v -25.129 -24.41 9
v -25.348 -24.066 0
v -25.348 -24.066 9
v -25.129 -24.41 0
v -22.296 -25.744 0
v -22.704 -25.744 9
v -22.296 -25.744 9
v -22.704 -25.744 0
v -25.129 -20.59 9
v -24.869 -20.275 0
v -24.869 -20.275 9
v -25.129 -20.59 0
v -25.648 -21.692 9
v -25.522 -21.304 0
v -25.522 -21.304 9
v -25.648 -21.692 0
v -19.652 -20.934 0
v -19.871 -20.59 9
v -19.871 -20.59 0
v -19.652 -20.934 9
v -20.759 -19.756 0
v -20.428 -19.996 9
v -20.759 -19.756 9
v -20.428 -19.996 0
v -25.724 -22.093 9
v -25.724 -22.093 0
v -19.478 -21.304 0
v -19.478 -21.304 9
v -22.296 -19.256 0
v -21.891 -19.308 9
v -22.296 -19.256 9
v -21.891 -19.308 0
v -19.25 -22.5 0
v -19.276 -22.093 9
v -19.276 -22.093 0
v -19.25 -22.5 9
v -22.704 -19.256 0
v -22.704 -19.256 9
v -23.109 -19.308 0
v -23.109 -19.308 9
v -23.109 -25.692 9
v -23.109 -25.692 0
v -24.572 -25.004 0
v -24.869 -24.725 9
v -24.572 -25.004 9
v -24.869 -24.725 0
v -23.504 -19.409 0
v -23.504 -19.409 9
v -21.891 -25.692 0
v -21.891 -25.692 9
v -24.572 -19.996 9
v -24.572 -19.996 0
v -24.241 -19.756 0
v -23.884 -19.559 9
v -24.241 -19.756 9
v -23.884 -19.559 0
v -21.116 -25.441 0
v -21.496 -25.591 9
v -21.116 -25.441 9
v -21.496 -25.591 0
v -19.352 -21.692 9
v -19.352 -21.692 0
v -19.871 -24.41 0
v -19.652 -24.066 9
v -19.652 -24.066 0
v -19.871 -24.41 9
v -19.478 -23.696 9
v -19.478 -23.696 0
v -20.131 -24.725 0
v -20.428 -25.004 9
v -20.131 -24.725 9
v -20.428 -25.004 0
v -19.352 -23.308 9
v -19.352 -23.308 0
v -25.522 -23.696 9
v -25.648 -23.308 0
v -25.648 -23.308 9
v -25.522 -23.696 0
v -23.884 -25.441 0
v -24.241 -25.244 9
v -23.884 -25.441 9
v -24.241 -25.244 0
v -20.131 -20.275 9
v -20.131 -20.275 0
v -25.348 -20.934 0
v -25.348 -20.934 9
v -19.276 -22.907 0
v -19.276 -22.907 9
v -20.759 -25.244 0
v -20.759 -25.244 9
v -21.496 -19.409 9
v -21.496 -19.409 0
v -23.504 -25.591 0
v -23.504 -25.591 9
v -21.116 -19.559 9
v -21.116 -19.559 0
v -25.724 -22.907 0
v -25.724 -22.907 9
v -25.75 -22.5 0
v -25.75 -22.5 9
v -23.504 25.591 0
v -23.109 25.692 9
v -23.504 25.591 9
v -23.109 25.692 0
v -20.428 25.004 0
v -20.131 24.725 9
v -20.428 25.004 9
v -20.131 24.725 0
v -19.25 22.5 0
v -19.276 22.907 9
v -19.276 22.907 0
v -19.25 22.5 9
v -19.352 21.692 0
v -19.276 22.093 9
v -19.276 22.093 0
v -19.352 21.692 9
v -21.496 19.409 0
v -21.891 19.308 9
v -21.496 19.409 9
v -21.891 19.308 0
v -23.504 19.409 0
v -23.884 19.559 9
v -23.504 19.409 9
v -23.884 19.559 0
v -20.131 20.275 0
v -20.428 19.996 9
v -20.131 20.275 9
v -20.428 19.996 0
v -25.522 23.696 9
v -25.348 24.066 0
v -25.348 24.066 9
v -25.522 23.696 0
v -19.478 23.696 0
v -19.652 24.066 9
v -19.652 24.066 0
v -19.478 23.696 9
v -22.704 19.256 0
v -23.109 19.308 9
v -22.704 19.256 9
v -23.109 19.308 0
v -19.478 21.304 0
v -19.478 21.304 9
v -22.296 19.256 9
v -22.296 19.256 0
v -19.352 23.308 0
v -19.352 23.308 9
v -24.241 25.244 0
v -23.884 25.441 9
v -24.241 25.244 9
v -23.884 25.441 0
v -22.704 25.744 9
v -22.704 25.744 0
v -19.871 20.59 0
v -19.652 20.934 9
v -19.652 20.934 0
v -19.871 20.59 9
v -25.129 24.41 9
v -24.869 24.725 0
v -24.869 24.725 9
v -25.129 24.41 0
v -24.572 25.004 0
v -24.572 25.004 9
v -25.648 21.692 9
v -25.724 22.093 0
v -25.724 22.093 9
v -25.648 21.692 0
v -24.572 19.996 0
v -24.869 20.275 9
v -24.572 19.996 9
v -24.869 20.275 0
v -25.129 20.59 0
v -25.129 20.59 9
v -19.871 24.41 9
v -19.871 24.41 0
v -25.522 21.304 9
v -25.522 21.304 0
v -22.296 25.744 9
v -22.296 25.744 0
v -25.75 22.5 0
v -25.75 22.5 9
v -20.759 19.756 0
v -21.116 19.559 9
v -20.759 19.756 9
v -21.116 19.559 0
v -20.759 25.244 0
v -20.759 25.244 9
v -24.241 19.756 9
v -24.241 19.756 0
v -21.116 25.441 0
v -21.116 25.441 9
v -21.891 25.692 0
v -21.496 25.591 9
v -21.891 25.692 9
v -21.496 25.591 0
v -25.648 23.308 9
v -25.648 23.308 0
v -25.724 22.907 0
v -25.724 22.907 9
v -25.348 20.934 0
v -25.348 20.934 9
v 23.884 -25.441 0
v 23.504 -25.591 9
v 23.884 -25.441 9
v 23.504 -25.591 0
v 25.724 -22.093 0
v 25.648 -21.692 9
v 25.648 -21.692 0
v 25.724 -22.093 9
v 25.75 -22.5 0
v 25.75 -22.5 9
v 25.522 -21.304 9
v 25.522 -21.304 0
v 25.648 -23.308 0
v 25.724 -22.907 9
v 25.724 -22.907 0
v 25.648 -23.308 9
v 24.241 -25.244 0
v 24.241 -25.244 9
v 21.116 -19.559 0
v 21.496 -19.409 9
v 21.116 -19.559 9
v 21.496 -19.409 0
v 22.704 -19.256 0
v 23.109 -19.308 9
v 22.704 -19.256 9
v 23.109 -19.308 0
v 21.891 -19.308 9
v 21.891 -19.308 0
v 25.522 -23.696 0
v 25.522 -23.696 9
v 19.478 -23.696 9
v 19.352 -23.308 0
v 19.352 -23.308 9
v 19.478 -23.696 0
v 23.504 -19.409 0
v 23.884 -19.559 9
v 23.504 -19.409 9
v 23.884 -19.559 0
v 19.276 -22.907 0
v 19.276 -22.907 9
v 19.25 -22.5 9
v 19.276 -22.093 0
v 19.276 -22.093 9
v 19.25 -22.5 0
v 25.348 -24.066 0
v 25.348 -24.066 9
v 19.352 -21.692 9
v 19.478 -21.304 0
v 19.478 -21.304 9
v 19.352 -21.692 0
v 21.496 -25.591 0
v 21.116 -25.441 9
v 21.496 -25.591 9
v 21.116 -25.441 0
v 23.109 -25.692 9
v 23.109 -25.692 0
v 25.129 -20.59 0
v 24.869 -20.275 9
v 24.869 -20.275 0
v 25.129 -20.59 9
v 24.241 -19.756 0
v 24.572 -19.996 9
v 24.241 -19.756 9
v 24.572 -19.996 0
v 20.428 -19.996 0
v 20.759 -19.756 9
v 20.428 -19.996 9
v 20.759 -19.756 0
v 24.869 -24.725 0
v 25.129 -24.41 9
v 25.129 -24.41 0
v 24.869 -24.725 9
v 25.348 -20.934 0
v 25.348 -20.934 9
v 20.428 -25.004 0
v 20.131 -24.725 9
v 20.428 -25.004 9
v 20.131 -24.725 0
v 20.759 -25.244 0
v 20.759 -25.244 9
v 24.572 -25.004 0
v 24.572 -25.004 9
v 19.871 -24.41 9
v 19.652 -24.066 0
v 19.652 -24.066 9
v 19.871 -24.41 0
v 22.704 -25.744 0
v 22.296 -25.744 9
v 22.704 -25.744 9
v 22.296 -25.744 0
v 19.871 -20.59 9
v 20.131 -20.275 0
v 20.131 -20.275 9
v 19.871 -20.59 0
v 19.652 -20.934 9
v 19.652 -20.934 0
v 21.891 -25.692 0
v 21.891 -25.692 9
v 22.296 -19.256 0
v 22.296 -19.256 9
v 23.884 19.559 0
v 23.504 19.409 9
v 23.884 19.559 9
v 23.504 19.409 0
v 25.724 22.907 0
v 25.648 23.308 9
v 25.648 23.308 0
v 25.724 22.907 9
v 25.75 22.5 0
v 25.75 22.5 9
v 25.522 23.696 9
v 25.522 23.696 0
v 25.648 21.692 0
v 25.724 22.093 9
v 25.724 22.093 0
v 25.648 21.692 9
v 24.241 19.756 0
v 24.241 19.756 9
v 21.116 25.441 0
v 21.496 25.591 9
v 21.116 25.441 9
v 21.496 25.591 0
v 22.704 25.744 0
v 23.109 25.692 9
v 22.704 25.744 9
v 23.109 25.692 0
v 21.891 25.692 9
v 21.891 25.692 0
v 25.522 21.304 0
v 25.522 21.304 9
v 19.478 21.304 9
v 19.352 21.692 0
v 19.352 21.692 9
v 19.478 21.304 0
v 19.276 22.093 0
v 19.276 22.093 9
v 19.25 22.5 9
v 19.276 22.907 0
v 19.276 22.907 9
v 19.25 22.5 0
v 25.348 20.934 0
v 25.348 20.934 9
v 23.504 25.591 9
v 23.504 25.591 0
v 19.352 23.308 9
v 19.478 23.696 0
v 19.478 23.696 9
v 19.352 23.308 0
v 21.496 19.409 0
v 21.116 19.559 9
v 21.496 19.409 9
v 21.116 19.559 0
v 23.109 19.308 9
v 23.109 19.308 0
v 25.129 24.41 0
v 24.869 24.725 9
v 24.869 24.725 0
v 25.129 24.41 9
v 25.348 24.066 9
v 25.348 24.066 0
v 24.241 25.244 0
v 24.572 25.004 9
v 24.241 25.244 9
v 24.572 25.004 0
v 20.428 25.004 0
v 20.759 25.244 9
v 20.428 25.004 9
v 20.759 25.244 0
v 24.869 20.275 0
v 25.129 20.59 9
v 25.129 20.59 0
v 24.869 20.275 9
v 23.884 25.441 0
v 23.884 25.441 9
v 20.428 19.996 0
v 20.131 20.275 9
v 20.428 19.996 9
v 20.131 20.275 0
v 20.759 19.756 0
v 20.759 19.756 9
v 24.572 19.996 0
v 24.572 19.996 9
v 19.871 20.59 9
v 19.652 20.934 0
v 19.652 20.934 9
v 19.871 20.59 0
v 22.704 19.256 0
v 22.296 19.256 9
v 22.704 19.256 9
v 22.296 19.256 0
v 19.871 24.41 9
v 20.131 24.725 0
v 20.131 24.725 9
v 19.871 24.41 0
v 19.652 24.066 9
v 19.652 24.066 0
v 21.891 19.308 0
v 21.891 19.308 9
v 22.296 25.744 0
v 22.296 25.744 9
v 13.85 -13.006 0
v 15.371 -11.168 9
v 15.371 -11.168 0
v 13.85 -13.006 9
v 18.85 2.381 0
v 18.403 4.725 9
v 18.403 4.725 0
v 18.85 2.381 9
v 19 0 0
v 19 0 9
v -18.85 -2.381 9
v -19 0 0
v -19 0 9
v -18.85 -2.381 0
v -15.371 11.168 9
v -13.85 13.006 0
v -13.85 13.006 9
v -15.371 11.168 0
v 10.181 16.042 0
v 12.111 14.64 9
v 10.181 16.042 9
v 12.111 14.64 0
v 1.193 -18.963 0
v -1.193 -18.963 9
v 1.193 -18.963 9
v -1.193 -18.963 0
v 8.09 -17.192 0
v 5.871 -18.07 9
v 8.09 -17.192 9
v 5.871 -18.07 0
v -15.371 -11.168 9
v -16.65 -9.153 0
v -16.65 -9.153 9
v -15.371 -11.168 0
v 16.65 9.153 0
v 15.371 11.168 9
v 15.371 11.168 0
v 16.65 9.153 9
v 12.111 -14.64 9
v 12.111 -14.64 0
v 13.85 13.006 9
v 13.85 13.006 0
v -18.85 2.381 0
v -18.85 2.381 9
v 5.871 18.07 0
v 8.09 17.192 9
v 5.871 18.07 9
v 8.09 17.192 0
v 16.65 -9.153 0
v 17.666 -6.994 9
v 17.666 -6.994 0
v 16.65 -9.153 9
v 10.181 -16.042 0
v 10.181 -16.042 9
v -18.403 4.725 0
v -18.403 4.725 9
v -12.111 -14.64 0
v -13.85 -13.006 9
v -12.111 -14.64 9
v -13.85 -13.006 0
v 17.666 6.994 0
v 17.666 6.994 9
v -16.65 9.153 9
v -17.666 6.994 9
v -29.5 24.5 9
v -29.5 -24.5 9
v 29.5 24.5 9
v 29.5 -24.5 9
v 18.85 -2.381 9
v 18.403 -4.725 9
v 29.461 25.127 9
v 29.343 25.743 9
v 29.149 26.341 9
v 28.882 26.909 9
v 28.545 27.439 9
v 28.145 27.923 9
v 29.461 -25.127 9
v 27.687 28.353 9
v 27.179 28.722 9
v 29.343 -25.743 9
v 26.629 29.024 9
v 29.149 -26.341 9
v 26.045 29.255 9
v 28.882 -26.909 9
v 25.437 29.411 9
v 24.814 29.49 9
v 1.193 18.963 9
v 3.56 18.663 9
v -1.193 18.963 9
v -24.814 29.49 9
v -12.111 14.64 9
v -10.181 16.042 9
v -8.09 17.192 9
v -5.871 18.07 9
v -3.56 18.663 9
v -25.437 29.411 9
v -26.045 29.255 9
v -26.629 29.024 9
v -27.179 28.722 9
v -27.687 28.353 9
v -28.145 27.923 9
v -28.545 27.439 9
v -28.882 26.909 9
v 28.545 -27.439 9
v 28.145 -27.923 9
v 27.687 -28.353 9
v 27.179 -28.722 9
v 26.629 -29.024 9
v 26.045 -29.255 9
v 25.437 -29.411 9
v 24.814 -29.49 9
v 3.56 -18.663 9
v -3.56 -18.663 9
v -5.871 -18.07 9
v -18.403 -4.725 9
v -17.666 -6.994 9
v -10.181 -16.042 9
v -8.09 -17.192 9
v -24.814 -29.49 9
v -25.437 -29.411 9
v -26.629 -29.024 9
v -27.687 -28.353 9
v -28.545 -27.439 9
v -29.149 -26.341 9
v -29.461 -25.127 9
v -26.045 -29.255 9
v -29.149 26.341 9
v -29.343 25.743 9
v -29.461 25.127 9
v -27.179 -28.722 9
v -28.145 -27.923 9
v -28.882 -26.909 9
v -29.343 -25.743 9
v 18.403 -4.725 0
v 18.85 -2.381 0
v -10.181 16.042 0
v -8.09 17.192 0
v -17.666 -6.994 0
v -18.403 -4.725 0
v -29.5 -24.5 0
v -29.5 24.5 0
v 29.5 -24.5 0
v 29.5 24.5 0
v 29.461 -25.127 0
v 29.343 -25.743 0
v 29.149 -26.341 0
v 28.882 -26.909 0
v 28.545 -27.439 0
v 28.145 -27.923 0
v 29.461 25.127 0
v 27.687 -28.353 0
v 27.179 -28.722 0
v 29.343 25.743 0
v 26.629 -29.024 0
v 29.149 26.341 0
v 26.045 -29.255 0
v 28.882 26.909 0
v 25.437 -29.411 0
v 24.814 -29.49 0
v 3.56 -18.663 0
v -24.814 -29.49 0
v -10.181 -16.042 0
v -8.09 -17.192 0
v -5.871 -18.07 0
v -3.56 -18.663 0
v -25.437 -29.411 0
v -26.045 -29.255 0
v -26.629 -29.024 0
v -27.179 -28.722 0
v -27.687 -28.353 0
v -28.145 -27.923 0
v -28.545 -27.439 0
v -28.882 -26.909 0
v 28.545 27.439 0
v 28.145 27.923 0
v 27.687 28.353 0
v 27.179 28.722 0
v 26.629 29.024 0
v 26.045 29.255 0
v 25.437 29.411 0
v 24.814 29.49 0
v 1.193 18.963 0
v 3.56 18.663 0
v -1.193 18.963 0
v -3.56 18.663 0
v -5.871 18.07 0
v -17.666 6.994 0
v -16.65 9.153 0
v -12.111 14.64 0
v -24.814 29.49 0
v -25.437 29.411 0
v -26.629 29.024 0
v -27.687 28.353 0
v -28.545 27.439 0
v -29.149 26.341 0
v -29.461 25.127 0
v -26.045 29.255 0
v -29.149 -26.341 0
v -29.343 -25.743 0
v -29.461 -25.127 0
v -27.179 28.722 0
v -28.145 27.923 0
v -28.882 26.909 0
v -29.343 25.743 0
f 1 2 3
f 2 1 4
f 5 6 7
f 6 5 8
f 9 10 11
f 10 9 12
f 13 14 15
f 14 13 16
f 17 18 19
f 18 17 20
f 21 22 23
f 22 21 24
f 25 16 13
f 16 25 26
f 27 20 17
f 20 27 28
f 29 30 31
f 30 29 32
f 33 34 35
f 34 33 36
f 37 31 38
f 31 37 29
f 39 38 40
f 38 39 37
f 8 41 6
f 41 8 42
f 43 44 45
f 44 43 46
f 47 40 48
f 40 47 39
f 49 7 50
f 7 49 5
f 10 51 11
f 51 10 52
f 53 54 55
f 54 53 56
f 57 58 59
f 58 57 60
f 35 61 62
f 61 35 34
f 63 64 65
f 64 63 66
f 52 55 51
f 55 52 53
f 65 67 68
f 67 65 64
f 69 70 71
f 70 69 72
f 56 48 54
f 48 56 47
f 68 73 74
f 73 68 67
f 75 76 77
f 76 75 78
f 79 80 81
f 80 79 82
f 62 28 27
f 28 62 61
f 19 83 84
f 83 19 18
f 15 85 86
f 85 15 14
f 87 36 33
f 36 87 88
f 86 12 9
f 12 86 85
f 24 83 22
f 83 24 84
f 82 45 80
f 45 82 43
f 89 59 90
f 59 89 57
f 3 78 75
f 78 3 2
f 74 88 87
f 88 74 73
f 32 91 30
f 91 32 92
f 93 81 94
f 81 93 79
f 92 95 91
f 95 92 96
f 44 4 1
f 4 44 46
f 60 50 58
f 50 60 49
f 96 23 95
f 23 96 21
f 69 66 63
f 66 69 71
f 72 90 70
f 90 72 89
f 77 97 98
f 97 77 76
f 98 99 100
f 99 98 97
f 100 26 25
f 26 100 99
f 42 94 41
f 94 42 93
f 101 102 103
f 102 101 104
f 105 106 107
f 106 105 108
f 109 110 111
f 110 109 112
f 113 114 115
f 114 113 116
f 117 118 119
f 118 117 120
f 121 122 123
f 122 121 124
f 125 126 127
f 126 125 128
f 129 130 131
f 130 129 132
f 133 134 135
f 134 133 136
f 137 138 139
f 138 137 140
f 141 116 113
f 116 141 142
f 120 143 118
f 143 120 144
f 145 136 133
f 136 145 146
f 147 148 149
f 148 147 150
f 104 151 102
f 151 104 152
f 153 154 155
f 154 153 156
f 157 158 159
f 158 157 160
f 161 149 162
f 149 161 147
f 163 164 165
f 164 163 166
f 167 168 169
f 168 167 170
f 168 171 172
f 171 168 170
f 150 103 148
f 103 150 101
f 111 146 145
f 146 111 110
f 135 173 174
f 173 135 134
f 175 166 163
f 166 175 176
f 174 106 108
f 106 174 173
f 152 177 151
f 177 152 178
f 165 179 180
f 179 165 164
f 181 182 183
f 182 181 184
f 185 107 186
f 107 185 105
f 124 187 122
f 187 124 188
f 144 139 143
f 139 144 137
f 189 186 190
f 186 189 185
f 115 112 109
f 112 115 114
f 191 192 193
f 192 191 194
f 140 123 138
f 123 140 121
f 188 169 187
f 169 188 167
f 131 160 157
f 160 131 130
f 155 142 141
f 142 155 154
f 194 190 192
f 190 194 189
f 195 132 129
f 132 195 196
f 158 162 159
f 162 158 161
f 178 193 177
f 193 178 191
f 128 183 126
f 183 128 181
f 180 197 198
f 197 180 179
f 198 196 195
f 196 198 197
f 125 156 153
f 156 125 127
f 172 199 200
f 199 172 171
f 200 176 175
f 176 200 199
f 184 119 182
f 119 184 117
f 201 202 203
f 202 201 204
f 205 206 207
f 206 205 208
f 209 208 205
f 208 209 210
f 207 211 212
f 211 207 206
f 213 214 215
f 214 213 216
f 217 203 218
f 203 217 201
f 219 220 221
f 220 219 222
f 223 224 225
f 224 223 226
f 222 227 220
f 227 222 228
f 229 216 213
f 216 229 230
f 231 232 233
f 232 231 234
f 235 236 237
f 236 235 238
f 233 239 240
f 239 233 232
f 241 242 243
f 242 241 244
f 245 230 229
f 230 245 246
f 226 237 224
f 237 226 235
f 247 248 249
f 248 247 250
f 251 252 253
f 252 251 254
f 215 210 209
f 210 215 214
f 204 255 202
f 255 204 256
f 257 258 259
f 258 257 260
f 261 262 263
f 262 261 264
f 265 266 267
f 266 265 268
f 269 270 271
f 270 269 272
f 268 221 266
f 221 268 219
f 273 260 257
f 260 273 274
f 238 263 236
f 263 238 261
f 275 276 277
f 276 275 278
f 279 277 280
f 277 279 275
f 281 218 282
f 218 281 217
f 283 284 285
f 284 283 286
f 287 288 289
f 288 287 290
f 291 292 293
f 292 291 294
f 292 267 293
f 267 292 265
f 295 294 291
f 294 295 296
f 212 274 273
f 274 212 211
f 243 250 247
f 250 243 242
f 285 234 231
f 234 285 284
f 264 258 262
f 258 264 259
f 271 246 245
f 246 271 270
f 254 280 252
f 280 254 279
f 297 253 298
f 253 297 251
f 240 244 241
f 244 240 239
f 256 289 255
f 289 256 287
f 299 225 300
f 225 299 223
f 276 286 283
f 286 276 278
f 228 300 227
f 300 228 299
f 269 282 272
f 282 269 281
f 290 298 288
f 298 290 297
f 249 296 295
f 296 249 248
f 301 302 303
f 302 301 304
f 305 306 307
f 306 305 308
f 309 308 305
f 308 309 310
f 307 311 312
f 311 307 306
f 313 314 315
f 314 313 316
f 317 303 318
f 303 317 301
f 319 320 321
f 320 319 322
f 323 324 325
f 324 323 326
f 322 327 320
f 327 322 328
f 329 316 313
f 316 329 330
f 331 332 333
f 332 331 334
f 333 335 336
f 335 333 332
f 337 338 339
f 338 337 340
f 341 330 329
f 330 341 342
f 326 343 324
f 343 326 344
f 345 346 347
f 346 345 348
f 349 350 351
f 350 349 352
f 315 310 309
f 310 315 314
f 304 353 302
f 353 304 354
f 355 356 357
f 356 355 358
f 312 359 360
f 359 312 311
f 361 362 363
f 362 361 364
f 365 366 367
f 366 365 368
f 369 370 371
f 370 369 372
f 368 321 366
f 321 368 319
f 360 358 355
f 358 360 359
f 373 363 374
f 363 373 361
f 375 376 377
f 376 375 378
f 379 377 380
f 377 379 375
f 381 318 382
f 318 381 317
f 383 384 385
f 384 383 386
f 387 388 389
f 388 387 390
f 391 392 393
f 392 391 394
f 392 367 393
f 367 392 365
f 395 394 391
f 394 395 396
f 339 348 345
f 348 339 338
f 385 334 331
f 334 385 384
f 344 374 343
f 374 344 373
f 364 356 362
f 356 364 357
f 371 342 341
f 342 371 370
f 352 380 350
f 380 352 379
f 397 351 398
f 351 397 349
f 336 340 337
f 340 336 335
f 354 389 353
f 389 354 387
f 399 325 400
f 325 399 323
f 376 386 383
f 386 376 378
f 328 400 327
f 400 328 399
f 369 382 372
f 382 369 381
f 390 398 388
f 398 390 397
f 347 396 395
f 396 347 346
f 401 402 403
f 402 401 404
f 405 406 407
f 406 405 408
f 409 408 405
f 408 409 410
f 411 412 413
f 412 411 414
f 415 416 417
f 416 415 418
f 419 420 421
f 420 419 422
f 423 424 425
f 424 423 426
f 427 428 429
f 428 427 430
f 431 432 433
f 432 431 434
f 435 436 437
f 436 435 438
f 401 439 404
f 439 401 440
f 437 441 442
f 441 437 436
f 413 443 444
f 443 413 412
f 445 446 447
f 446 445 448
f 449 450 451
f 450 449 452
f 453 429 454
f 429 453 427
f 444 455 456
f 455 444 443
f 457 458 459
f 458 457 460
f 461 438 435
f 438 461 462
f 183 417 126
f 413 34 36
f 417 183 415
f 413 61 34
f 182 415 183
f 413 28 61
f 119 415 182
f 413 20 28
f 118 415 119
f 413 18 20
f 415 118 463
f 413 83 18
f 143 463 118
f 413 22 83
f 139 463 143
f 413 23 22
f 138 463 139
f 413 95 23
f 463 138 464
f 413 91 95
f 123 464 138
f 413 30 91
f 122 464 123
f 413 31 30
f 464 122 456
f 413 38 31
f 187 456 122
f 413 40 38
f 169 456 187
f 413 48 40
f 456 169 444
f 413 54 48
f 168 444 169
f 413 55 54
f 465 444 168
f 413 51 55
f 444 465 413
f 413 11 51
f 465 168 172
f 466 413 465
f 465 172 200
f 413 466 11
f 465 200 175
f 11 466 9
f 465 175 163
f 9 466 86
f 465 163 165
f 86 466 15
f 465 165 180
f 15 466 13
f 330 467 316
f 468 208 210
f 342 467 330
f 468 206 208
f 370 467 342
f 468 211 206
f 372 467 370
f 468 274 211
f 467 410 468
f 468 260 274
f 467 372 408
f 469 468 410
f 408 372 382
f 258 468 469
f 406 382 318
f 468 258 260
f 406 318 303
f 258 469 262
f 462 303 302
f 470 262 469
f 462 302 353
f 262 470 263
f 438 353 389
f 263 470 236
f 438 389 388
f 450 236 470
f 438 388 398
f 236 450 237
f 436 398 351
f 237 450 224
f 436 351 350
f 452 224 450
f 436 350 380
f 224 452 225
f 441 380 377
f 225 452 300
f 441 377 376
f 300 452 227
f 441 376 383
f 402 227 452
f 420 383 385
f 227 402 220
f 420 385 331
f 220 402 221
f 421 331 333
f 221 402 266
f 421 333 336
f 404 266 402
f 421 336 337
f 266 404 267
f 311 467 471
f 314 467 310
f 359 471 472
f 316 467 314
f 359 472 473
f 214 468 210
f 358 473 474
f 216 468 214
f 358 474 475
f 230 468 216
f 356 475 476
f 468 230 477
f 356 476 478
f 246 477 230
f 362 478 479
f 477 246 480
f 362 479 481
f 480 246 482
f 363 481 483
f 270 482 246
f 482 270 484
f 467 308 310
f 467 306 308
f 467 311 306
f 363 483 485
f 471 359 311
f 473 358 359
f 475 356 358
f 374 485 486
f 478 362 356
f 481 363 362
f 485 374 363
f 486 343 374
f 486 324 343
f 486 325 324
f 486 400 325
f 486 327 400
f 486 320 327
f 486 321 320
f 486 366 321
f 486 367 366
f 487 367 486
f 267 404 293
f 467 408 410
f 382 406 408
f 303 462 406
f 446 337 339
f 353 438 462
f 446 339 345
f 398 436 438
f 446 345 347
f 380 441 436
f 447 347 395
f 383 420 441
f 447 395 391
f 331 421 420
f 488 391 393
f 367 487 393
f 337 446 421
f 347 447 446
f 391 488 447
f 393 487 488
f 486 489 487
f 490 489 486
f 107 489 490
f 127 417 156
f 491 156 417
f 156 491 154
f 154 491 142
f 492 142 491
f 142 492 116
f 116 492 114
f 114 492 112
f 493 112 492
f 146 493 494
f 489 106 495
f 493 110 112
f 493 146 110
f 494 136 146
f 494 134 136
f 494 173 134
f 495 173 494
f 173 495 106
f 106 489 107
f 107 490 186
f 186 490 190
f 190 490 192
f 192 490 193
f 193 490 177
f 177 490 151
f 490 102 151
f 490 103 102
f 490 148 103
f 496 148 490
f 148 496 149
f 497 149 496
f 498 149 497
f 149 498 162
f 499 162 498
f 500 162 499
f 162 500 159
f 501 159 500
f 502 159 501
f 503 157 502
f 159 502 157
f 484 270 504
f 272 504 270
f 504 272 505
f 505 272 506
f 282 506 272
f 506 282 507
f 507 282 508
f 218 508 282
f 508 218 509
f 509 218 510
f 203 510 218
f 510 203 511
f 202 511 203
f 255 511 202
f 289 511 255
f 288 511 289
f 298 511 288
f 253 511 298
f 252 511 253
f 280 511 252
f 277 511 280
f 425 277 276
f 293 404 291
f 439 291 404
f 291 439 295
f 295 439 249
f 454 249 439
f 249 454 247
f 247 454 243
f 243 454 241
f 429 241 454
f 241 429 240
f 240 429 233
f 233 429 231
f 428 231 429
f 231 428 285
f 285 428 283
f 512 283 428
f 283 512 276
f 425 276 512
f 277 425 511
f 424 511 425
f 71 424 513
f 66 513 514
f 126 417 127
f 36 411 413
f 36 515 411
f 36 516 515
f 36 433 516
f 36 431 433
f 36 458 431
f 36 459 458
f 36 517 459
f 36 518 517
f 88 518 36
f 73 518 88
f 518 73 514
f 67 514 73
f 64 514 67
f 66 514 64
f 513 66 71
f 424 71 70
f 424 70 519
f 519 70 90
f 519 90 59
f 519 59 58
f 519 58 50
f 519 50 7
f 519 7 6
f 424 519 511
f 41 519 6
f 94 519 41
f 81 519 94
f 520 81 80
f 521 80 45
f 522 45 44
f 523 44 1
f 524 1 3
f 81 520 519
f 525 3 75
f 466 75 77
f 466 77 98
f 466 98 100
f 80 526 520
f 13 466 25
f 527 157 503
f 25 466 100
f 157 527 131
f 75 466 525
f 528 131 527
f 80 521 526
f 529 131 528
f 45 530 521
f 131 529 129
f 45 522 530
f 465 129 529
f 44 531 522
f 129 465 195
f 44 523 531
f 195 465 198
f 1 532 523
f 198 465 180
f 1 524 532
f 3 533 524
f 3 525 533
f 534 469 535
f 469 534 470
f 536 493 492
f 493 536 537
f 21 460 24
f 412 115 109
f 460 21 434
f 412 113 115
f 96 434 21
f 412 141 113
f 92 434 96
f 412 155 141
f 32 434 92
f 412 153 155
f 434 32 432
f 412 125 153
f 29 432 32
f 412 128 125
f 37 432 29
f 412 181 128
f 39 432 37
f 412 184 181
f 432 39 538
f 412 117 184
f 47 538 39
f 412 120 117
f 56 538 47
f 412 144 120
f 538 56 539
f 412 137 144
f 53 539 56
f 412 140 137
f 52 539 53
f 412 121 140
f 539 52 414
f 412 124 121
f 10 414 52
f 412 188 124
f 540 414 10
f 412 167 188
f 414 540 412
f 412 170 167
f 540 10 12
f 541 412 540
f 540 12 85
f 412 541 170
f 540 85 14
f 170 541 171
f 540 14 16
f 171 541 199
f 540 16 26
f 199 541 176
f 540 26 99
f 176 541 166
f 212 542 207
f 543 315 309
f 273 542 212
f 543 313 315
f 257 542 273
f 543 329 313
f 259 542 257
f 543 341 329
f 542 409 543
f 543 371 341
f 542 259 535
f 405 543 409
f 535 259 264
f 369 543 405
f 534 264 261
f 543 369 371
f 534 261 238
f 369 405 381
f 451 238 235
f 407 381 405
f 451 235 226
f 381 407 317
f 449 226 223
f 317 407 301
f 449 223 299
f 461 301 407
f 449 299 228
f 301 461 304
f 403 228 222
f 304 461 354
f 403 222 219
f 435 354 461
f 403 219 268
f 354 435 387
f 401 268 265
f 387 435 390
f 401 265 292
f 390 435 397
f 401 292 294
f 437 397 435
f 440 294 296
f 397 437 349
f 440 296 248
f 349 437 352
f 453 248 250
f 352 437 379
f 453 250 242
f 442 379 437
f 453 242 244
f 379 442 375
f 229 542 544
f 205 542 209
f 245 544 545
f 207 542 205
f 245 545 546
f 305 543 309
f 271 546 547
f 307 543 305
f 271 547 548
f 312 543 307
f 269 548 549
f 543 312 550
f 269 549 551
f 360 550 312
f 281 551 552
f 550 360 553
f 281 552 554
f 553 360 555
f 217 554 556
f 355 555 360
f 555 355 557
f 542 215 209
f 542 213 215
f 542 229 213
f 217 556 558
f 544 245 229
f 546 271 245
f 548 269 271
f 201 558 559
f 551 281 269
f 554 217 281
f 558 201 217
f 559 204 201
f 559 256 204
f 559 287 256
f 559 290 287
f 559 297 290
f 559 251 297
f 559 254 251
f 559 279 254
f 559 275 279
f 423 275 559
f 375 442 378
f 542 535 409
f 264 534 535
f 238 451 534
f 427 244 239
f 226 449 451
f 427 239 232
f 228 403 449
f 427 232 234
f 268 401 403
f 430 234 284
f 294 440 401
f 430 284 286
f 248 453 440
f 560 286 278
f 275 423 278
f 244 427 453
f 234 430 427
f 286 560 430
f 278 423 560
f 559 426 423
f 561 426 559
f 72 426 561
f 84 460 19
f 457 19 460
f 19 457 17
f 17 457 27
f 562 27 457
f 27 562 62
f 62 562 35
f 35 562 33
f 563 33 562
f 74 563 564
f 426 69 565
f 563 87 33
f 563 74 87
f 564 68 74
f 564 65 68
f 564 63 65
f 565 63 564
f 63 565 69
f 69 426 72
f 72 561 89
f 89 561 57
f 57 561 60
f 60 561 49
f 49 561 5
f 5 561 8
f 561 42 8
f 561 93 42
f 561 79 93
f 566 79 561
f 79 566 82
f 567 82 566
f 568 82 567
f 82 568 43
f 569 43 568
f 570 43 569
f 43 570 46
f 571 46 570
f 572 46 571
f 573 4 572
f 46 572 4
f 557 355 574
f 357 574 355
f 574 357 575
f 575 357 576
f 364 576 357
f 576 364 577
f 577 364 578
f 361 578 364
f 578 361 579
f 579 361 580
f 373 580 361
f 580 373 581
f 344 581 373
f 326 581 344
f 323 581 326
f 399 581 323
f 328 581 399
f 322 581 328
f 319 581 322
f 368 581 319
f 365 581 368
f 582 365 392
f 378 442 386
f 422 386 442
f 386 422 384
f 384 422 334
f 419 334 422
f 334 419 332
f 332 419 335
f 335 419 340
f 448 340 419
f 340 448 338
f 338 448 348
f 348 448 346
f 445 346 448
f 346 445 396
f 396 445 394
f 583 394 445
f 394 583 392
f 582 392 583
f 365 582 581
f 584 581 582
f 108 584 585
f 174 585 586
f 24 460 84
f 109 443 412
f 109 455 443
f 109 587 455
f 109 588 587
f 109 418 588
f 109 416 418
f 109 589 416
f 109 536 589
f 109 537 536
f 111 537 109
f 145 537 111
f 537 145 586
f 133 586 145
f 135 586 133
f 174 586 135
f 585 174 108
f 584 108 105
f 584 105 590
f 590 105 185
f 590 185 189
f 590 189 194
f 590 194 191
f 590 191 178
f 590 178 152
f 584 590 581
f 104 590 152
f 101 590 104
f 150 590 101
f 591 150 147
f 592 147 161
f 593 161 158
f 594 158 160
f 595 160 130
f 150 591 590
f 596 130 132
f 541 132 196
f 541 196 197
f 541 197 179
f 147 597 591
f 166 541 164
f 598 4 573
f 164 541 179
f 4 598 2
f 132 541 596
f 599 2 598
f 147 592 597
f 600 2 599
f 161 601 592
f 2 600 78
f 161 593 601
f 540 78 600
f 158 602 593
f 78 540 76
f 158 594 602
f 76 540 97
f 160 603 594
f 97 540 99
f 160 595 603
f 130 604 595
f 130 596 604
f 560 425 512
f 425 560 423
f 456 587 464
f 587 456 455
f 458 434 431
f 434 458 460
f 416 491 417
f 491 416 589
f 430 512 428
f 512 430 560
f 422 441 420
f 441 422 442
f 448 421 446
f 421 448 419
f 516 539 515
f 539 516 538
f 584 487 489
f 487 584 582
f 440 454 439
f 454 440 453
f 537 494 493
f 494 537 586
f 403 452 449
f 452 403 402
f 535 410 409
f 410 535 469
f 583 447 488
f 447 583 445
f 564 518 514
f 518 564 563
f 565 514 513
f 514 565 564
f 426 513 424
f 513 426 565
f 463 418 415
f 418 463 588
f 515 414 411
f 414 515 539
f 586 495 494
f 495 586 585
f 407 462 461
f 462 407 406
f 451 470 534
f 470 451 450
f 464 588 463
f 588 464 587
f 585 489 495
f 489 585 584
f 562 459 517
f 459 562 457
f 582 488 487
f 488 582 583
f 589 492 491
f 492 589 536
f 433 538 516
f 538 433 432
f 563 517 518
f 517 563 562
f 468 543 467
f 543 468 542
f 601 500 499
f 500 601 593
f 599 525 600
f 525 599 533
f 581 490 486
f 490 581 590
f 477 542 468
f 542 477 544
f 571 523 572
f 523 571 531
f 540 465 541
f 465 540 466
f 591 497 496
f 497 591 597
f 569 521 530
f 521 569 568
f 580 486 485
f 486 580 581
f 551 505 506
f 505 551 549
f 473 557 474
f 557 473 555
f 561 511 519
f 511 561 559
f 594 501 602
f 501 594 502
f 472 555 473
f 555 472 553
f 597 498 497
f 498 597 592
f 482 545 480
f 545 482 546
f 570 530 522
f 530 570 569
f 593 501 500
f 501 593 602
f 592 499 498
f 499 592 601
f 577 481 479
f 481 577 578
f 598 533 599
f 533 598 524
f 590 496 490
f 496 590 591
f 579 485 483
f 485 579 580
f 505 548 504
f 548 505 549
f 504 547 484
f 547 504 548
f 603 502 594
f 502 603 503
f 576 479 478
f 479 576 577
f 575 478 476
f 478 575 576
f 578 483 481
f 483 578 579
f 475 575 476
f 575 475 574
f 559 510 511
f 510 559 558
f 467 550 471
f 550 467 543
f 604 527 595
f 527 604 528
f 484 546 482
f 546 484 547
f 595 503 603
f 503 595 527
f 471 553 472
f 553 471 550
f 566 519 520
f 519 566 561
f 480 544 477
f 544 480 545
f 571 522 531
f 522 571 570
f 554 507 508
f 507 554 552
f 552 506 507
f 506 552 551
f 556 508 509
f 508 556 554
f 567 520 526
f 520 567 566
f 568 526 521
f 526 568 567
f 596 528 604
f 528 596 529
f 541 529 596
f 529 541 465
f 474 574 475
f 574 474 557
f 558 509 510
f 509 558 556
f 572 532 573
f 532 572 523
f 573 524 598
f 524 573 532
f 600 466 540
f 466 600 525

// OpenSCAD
$fn = 50;


difference() {
	union() {
		hull() {
			translate(v = [-24.5000000000, 24.5000000000, 0]) {
				cylinder(h = 9, r = 5);
			}
			translate(v = [24.5000000000, 24.5000000000, 0]) {
				cylinder(h = 9, r = 5);
			}
			translate(v = [-24.5000000000, -24.5000000000, 0]) {
				cylinder(h = 9, r = 5);
			}
			translate(v = [24.5000000000, -24.5000000000, 0]) {
				cylinder(h = 9, r = 5);
			}
		}
	}
	union() {
		#translate(v = [-22.5000000000, -22.5000000000, -100.0000000000]) {
			cylinder(h = 200, r = 3.2500000000);
		}
		#translate(v = [-22.5000000000, 22.5000000000, -100.0000000000]) {
			cylinder(h = 200, r = 3.2500000000);
		}
		#translate(v = [22.5000000000, -22.5000000000, -100.0000000000]) {
			cylinder(h = 200, r = 3.2500000000);
		}
		#translate(v = [22.5000000000, 22.5000000000, -100.0000000000]) {
			cylinder(h = 200, r = 3.2500000000);
		}
		#cylinder(h = 9, r = 19.0000000000);
	}
}
